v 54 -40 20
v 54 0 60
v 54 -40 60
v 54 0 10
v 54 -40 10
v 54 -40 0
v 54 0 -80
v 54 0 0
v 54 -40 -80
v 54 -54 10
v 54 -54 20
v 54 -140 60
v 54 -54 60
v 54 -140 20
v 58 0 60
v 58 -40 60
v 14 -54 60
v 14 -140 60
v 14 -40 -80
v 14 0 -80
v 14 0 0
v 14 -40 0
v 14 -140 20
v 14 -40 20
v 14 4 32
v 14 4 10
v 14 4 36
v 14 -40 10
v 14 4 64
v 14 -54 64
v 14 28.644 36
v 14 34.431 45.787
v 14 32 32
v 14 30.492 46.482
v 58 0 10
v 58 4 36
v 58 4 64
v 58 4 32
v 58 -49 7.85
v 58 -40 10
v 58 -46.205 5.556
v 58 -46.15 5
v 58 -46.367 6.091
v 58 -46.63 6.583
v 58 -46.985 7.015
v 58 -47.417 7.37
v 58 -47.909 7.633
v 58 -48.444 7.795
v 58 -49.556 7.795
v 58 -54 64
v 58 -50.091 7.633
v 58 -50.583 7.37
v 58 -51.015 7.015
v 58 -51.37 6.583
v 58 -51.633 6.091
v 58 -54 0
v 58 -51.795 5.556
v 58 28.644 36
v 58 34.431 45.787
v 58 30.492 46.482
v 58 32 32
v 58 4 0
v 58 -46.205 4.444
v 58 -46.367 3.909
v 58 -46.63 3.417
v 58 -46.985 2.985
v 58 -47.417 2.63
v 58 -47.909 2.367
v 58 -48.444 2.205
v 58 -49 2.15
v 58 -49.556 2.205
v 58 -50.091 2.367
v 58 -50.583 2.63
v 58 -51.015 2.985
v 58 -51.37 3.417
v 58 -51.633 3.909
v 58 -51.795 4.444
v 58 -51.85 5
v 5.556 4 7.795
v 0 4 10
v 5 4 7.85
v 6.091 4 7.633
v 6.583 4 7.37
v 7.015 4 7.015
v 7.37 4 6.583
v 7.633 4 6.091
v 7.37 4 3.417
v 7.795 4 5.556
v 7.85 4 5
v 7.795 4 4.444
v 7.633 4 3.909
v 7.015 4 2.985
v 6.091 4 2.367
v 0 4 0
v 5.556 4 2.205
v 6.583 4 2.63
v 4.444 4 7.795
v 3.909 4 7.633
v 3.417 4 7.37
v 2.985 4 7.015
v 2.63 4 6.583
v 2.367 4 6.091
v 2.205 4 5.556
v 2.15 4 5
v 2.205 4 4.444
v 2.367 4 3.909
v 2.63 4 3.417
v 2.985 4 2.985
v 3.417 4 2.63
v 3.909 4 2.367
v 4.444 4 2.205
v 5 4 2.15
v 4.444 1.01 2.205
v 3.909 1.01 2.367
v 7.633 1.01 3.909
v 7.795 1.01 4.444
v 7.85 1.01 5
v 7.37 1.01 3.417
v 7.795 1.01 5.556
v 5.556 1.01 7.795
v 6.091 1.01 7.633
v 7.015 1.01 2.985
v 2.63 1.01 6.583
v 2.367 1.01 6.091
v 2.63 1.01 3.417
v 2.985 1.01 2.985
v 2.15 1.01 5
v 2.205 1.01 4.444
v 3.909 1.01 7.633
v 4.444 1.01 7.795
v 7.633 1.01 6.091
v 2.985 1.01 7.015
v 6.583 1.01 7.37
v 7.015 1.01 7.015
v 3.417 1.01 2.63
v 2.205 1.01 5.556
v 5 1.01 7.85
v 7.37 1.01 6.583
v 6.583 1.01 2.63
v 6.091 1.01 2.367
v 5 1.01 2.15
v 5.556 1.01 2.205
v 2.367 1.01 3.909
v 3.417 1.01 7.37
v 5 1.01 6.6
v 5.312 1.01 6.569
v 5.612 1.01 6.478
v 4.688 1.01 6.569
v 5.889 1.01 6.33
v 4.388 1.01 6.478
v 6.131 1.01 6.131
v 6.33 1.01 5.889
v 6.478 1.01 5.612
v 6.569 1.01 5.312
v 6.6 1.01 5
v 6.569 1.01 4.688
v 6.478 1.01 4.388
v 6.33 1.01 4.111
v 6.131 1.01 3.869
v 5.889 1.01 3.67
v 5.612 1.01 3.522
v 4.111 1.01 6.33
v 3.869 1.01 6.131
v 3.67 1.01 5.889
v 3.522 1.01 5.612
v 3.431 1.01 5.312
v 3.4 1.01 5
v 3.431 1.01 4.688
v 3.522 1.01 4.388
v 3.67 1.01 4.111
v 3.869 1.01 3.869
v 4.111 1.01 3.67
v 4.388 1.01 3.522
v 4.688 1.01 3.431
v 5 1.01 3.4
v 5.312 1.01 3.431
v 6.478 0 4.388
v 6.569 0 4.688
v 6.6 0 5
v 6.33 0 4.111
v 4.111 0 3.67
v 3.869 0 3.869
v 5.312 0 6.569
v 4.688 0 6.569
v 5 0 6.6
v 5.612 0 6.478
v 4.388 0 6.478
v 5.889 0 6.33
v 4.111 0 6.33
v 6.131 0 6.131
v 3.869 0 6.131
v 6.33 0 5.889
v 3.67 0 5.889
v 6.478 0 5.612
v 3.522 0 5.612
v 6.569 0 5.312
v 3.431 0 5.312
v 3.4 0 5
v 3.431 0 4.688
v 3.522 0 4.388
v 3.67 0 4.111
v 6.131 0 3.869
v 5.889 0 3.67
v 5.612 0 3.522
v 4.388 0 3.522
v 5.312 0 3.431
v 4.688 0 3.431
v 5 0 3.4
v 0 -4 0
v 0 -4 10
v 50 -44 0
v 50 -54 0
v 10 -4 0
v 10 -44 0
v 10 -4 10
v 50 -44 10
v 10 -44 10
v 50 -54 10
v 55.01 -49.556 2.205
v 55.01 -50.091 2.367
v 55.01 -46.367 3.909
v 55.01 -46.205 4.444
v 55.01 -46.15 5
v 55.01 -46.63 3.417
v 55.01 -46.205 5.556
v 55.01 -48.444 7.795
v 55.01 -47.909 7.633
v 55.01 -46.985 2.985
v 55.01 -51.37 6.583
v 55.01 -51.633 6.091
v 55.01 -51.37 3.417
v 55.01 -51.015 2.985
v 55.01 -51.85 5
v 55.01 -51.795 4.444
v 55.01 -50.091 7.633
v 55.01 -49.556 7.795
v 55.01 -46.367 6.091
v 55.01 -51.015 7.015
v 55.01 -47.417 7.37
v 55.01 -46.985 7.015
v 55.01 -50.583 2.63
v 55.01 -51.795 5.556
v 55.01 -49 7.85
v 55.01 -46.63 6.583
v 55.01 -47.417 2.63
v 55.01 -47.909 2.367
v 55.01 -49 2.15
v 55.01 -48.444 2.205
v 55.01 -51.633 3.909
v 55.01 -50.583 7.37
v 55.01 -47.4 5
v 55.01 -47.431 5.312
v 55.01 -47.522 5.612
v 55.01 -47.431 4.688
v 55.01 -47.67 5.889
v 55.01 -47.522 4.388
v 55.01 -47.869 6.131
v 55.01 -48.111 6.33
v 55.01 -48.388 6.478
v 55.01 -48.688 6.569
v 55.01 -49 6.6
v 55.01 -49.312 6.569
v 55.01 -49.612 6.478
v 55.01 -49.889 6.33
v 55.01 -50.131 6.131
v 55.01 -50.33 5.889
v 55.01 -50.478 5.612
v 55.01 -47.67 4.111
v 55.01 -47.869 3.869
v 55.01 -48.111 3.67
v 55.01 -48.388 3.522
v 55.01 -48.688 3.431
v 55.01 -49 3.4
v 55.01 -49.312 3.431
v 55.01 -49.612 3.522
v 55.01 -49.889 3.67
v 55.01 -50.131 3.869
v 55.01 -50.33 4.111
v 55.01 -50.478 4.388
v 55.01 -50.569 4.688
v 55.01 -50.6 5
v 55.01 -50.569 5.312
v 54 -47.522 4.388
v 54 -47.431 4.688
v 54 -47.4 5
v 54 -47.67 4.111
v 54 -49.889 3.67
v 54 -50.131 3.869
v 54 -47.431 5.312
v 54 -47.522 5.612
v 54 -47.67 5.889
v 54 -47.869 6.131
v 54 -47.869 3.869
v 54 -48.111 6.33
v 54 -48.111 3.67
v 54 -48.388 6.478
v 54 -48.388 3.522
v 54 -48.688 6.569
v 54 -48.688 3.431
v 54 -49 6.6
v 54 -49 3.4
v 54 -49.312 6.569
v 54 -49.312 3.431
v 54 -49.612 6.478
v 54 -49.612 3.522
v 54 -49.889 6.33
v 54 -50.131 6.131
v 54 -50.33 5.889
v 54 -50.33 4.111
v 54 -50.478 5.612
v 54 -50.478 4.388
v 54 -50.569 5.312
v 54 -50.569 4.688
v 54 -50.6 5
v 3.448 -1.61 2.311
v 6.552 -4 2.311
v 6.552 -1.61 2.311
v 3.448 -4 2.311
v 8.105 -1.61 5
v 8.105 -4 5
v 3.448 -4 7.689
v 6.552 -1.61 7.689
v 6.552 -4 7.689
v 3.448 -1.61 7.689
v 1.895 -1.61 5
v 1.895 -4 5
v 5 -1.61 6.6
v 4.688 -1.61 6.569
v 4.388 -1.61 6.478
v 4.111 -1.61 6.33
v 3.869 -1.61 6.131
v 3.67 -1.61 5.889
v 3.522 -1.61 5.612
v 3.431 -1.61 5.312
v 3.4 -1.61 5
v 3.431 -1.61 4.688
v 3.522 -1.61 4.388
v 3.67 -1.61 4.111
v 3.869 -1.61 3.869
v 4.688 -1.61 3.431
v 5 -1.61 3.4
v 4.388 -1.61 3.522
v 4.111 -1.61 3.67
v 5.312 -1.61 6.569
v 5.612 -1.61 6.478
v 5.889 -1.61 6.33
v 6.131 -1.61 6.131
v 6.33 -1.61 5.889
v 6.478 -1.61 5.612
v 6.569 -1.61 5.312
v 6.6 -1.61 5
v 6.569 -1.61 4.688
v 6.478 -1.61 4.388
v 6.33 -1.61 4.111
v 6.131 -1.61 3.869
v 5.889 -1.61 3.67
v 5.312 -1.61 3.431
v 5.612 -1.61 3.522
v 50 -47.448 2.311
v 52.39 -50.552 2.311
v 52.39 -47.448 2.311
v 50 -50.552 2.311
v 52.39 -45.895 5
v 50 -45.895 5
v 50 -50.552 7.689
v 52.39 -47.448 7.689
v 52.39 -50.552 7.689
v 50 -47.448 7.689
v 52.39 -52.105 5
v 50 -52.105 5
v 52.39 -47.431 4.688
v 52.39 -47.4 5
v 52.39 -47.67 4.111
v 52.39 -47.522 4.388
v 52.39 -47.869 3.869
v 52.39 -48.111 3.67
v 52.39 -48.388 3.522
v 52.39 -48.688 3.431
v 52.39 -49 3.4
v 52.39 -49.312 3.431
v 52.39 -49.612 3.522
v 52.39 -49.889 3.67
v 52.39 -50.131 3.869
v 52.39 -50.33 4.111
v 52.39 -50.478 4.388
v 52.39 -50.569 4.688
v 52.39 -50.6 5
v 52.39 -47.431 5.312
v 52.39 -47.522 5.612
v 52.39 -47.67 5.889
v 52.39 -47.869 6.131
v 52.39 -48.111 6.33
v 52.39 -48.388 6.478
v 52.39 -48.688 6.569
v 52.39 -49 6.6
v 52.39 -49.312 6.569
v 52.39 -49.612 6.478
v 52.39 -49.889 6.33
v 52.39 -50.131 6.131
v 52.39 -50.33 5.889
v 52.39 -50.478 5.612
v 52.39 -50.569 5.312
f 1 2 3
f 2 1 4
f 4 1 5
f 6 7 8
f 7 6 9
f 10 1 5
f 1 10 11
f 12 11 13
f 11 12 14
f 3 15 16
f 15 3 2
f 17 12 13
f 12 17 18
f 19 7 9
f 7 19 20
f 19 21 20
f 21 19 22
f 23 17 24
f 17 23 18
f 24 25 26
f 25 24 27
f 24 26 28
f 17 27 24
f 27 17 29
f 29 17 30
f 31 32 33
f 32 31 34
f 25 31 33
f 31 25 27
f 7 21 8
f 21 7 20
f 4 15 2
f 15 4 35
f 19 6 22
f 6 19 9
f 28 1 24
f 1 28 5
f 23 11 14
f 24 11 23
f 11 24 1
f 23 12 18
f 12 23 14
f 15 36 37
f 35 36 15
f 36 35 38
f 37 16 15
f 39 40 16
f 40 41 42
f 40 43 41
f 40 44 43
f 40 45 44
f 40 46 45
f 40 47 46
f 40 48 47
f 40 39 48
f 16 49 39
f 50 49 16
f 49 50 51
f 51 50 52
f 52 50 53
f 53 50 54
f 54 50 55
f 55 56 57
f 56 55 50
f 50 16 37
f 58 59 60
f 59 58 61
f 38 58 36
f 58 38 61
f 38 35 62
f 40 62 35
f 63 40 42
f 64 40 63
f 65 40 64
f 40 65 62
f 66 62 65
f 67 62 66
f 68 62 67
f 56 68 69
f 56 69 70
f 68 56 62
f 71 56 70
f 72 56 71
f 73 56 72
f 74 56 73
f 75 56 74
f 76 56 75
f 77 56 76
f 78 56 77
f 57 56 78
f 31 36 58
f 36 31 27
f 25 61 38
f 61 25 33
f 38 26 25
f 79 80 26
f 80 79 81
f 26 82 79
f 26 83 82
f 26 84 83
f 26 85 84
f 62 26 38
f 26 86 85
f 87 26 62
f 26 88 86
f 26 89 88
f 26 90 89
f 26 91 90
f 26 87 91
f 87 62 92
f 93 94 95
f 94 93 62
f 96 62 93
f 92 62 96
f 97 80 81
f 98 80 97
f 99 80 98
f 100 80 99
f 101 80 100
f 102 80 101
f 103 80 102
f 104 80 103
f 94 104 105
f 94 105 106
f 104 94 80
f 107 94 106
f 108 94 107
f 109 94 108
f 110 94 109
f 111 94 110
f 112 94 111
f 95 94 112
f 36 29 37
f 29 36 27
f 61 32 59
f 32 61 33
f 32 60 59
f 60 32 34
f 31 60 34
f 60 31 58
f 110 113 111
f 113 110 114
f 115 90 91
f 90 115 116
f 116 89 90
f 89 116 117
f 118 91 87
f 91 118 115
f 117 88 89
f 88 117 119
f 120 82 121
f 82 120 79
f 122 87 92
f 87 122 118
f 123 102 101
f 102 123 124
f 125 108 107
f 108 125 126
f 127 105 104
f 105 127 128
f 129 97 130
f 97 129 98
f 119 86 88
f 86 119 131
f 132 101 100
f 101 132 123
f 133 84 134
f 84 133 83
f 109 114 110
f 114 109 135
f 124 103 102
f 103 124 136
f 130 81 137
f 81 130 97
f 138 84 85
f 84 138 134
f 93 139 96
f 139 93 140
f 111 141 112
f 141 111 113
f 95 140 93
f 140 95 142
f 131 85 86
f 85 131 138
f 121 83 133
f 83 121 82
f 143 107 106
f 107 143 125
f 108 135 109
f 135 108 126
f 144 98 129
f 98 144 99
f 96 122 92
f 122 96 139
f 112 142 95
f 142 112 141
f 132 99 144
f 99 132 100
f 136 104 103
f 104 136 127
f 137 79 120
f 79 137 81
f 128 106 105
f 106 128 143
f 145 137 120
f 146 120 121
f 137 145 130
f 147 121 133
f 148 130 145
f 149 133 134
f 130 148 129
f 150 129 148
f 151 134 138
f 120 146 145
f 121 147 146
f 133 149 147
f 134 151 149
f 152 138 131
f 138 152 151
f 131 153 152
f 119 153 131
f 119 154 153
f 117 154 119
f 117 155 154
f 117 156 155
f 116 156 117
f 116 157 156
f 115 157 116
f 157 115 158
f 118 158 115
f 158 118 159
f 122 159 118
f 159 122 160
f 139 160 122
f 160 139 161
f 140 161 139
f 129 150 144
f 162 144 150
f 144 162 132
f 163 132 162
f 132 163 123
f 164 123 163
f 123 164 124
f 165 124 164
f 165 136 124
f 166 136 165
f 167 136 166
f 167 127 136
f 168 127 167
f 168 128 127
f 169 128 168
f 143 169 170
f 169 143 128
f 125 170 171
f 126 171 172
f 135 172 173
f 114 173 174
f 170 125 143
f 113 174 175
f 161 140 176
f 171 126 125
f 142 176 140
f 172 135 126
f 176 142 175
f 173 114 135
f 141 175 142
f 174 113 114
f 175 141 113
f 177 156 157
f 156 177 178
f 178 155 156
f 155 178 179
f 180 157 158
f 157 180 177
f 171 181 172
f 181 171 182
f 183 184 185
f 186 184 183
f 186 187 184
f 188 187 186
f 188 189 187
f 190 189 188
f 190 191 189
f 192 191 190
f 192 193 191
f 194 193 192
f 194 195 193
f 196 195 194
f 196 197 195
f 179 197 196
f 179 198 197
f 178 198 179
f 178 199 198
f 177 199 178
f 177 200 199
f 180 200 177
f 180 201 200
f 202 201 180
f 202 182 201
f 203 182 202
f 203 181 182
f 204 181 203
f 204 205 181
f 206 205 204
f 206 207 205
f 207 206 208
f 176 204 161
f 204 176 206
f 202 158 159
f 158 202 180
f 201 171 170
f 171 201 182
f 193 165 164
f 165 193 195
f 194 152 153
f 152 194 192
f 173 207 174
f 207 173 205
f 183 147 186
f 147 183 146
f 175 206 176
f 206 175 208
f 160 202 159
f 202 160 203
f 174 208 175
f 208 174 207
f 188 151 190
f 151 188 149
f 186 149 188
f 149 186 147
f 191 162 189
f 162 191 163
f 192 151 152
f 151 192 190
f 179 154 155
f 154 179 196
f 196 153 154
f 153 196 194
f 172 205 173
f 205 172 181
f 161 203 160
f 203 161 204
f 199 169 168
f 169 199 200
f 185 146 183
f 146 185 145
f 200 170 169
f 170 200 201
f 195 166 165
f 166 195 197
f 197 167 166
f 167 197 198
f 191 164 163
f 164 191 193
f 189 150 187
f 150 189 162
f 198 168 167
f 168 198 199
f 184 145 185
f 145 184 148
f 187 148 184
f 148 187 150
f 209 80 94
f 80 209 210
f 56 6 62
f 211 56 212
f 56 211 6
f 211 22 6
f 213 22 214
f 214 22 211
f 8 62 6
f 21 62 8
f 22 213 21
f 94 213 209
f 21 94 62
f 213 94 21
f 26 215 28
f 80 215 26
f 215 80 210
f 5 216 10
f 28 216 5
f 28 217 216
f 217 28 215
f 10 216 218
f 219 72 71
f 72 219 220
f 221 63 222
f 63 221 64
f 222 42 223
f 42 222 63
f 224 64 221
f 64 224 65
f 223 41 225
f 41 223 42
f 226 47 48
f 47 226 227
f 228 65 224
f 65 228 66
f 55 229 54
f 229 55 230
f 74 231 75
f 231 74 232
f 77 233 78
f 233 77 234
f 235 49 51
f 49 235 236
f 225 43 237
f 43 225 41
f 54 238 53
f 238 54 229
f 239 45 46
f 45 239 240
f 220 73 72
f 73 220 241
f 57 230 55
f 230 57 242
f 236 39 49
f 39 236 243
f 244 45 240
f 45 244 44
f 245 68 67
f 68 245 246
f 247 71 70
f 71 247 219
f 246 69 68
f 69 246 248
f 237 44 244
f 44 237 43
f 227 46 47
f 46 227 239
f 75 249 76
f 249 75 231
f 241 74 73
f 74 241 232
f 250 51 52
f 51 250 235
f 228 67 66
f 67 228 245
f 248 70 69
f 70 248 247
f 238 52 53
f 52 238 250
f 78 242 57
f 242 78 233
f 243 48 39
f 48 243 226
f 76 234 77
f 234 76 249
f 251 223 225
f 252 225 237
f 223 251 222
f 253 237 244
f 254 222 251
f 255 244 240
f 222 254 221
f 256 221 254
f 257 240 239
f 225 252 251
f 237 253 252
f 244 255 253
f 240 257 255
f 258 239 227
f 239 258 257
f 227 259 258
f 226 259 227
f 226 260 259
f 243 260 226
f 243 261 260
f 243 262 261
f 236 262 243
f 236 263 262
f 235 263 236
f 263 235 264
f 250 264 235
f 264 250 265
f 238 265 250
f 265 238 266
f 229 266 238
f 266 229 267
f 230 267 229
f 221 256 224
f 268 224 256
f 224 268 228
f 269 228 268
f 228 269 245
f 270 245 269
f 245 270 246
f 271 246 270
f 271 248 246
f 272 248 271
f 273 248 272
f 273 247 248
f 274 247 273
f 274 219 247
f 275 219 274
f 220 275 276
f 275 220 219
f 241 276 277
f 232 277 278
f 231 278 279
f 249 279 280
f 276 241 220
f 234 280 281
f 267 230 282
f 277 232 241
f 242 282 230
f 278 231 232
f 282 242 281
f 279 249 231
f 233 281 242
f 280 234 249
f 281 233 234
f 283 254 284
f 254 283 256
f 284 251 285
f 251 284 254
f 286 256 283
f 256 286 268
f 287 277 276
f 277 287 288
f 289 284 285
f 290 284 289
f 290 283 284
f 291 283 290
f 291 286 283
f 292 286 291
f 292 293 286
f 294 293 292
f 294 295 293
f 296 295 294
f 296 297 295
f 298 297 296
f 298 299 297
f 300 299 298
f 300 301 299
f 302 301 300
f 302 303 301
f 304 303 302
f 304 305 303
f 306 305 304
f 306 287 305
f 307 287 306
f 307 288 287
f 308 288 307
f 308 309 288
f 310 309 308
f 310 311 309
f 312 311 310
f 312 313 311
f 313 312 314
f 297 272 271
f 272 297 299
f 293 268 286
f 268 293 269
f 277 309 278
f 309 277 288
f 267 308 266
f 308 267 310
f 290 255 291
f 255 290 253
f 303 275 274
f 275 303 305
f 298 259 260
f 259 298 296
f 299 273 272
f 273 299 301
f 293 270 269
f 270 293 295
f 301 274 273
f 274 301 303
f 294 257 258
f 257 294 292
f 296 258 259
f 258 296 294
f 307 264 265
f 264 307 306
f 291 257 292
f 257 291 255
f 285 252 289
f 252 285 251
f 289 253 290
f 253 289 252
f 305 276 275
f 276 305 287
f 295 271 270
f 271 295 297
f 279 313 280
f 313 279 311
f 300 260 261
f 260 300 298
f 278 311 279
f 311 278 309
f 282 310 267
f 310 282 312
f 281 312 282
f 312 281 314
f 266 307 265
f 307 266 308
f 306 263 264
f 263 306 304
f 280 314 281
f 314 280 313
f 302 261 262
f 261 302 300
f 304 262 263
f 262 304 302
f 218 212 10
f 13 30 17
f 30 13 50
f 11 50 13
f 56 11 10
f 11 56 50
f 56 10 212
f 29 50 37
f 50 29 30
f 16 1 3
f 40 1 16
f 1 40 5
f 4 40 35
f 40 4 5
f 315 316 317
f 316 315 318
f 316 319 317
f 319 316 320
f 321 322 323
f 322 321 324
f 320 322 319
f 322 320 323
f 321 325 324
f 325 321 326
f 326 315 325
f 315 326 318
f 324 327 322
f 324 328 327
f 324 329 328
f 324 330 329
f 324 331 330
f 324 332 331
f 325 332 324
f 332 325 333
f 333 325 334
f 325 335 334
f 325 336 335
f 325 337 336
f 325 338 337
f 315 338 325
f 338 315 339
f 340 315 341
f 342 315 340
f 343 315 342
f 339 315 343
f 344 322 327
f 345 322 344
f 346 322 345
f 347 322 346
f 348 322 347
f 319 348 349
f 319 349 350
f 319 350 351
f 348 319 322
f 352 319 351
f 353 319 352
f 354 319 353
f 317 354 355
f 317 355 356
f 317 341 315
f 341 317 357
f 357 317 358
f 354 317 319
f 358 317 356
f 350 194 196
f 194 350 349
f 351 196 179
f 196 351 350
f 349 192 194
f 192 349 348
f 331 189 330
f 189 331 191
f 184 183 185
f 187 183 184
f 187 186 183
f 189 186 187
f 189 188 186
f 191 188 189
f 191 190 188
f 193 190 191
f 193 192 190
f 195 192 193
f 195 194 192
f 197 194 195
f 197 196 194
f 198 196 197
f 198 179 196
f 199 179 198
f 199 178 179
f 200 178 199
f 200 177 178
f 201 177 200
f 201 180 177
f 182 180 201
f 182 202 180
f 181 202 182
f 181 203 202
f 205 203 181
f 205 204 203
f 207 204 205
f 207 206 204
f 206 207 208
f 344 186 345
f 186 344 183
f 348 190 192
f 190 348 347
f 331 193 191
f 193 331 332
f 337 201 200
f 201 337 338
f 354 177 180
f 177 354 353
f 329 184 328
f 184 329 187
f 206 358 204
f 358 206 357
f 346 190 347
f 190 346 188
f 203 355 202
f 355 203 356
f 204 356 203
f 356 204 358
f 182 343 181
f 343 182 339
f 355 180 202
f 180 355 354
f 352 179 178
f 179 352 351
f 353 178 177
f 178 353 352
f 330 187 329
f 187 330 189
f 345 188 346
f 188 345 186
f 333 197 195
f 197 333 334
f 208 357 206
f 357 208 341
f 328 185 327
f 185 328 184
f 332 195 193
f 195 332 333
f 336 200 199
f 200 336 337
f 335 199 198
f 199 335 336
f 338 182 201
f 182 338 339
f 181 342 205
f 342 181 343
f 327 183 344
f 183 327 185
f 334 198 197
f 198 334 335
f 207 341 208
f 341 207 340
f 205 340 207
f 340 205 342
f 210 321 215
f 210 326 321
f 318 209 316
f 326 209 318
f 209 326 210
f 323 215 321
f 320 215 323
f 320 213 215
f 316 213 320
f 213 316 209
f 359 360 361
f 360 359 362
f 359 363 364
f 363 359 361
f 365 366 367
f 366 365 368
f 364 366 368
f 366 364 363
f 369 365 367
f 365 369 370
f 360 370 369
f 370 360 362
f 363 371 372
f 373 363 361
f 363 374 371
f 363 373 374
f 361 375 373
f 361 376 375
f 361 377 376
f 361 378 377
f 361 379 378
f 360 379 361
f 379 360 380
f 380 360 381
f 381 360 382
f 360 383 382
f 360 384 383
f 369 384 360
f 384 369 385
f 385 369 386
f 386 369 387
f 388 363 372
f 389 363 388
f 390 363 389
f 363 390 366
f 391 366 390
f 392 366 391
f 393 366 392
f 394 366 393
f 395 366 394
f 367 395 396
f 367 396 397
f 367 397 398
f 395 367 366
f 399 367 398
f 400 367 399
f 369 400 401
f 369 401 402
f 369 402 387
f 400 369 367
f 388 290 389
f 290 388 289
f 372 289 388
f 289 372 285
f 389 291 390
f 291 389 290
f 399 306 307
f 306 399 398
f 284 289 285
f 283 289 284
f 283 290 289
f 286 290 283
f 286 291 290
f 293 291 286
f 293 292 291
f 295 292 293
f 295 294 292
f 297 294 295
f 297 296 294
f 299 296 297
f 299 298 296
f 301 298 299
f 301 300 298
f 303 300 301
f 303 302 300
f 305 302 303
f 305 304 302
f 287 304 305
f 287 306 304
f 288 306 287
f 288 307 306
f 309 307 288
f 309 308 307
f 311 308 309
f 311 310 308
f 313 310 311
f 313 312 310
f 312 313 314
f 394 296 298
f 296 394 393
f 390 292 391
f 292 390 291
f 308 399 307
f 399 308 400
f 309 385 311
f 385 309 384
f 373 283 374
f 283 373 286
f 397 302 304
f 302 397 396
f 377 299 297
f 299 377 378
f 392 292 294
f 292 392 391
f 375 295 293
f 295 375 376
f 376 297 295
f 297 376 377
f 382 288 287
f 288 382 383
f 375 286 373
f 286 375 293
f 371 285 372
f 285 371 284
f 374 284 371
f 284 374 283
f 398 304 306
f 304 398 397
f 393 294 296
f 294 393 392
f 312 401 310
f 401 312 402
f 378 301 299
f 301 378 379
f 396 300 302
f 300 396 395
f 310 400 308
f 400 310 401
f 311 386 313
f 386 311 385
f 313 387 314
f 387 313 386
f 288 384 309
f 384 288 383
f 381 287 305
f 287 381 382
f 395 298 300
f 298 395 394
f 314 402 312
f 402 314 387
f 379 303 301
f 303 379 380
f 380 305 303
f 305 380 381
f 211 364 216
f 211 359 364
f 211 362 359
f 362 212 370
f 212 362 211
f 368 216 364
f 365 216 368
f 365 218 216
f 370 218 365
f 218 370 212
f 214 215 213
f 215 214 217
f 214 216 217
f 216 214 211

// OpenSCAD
// file: ../common/din/base.scad
DIN_TOLERANCE = 0.1;

module din_help(name, _STD_TABLE) {
    echo("-----------------------------");
    echo(str("Size indexes for ", name));
    for(idx=[0:len(_STD_TABLE)-1]) {
        echo(str(idx, " = M", _STD_TABLE[idx][0]));
    }
    echo("-----------------------------");
}

module din_cutout_base(inner, outer, cap_height, height, fn) {
    translate([0, 0, height]) {
        mirror([0, 0, 1]) {
            cylinder(r=outer/2 + DIN_TOLERANCE, h=cap_height, center=false, $fn = fn);
            cylinder(r=inner/2 + DIN_TOLERANCE, h=height, center=false, $fn = 32);
        }
    }
}

module hex_nut(inner, outer, cap_height, height = 0) {
    din_cutout_base(inner, outer, cap_height, height, 6);
}

module round_bolt(inner, outer, cap_height, height = 0) {
    din_cutout_base(inner, outer, cap_height, height, 32);
}

translate([-10, 0, 0]) round_bolt(inner = 3, outer = 6.01, cap_height = 2.4, height = 10);
translate([10, 0, 0]) hex_nut(inner = 3, outer = 6.01, cap_height = 2.4, height = 10);
// file: ../common/din/din912.scad
use <./base.scad>
/*
    format: [size, diameter, cap_height]
            [d1, d2, k]
*/
_DIN_912_STD = [[2,3.8,2],[3,5.5,3],[4,7,4],[5,8.5,5],[6,10,6],[8,13,8],[10,16,10],[12,18,12],[14,21,14],[16,24,16],[18,27,18],[20,30,20],[24,36,24],[27,40,27],[30,45,30],[36,54,36]];

module din912_help() {
    din_help("DIN 912", _DIN_912_STD);
}

module din912_base(m_idx, height) {
    row = _DIN_912_STD[m_idx];
    inner = row[0];
    outer = row[1];
    cap_height = row[2];
    round_bolt(inner, outer, cap_height, height);
}

module din912(m_idx, height, coords) {
    difference() {
        children();
        for(i=[0:len(coords) - 1]) {
            translate([coords[i][0], coords[i][1], 0])
                din912_base(m_idx, height);
        }
    }
}

/* din912_help(); */

/*
din912(1, 10, [[5, 5]]) {
    cube([10, 10, 10]);
}
*/
// file: ../common/din/din934.scad
use <./base.scad>
/*
    format: [size, diameter, cap_height]
            [d1, e, m]
*/
_DIN_934_STD = [[1,2.72,0.8],[1.2,3.29,1],[1.4,3.29,1.2],[1.6,3.48,1.3],[1.7,3.82,1.4],[2,4.32,1.6],[2.3,4.95,1.8],[2.5,5.45,2],[2.6,5.51,2],[3,6.01,2.4],[3.5,6.01,2.8],[4,7.66,3.2],[5,8.76,4],[6,11.05,5],[7,12.12,5.5],[8,14.38,6.5],[10,18.9,8],[12,21.1,10],[14,24.49,11],[16,26.75,13],[18,29.56,15],[20,32.95,16],[22,35.03,18],[24,39.55,19],[27,45.2,22],[30,50.85,24],[33,55.37,26],[36,60.79,29],[39,66.44,31],[42,71.3,34],[45,76.95,36],[48,82.6,38],[52,88.25,42],[56,95.07,45],[60,100.72,48],[64,106.37,51],[68,112.02,54],[72,117.67,58],[76,123.32,61],[80,128.97,64],[85,133.11,68],[90,145.77,72],[95,151.42,76],[100,162.72,80],[105,16837,84],[110,174.02,88],[115,185.32,92],[120,190.97,96],[125,202.27,100],[130,207.75,104],[135,213.4,108],[140,224.7,112],[145,236,116],[150,236,120]];

module din934_help() {
    din_help("DIN 934", _DIN_934_STD);
}

module din934_base(m_idx, height) {
    row = _DIN_934_STD[m_idx];
    inner = row[0];
    outer = row[1];
    cap_height = row[2];
    hex_nut(inner, outer, cap_height, height);
}

module din934(m_idx, height, coords) {
    difference() {
        children();
        for(i=[0:len(coords) - 1]) {
            translate([coords[i][0], coords[i][1], 0])
                din934_base(m_idx, height);
        }
    }
}

/* din934_help(); */

/*
din934(9, 10, [[5, 5]]) {
    cube([10, 10, 10]);
}
*/
// main file
include <../common/din/din934.scad>
include <../common/din/din912.scad>


leg_side = 40;
front_height = 60;
joint_height = 10;
thickness = 4;
ear_size = 10;

headphones_joint_size = 28;

tolerance = 0.1;

module mock() {
    color(c = [1, 0, 0], alpha = 0.3) {
        union() {
            translate([0, 0, -100]) cube([leg_side, leg_side, 100 + leg_side]);
            translate([0, -100, 0]) cube([leg_side, 100, leg_side]);
        }
    }
}

module ear_base() {
    cube([ear_size + thickness, joint_height, thickness]);
}

module front_ear() {
    translate([0, 0, joint_height])
        rotate([-90, 0, 0])
            din912(1, thickness + 0.01, [[5, 5]])
                ear_base();
}

module back_ear() {
    translate([0, thickness, 0])
        rotate([90, 0, 0])
            din934(9, thickness + 0.01, [[5, 5]])
                ear_base();
}

module hook() {
    translate([ear_size + thickness, thickness, 0])
        cube([leg_side + thickness, headphones_joint_size, thickness]);

    translate([ear_size + thickness, headphones_joint_size + thickness, 0])
        rotate([80, 0, 0])
            cube([leg_side + thickness, headphones_joint_size * 0.5, thickness]);
}

module front_part() {
    union() {
        translate([ear_size + thickness, 0, 0])
            cube([leg_side + thickness, thickness, front_height + thickness]);

        translate([ear_size + thickness, -leg_side - ear_size - thickness, front_height])
            cube([leg_side + thickness, leg_side + ear_size + thickness, thickness]);

        translate([0, 0, front_height - headphones_joint_size])
            hook();

        front_ear();

        translate([ear_size + leg_side + thickness, -leg_side - ear_size - thickness, 0])
            rotate([0, 0, 270])
                mirror([1, 0, 0])
                    front_ear();
        translate([leg_side + ear_size + thickness, - leg_side - thickness - ear_size, joint_height])
            cube([thickness, ear_size + thickness, front_height - joint_height]);

        translate([ear_size + thickness + leg_side, - leg_side, 0])
            cube([thickness, leg_side, joint_height]);
    }
}

module back_part() {
    back_ear();
    translate([ear_size, -leg_side, 0])
        cube([thickness, leg_side, joint_height]);

    translate([ear_size + thickness, -leg_side, 0])
        cube([leg_side - thickness, thickness, joint_height]);

    translate([thickness + ear_size + leg_side - thickness, -leg_side - ear_size, 0])
        rotate([0, 0, 90])
            mirror([0, 1, 0])
                back_ear();
}

translate([ear_size + thickness, -leg_side, front_height - leg_side]) mock();

color(c = [0, 1, 0])
    front_part();

translate([0, -thickness, 0]) back_part();
